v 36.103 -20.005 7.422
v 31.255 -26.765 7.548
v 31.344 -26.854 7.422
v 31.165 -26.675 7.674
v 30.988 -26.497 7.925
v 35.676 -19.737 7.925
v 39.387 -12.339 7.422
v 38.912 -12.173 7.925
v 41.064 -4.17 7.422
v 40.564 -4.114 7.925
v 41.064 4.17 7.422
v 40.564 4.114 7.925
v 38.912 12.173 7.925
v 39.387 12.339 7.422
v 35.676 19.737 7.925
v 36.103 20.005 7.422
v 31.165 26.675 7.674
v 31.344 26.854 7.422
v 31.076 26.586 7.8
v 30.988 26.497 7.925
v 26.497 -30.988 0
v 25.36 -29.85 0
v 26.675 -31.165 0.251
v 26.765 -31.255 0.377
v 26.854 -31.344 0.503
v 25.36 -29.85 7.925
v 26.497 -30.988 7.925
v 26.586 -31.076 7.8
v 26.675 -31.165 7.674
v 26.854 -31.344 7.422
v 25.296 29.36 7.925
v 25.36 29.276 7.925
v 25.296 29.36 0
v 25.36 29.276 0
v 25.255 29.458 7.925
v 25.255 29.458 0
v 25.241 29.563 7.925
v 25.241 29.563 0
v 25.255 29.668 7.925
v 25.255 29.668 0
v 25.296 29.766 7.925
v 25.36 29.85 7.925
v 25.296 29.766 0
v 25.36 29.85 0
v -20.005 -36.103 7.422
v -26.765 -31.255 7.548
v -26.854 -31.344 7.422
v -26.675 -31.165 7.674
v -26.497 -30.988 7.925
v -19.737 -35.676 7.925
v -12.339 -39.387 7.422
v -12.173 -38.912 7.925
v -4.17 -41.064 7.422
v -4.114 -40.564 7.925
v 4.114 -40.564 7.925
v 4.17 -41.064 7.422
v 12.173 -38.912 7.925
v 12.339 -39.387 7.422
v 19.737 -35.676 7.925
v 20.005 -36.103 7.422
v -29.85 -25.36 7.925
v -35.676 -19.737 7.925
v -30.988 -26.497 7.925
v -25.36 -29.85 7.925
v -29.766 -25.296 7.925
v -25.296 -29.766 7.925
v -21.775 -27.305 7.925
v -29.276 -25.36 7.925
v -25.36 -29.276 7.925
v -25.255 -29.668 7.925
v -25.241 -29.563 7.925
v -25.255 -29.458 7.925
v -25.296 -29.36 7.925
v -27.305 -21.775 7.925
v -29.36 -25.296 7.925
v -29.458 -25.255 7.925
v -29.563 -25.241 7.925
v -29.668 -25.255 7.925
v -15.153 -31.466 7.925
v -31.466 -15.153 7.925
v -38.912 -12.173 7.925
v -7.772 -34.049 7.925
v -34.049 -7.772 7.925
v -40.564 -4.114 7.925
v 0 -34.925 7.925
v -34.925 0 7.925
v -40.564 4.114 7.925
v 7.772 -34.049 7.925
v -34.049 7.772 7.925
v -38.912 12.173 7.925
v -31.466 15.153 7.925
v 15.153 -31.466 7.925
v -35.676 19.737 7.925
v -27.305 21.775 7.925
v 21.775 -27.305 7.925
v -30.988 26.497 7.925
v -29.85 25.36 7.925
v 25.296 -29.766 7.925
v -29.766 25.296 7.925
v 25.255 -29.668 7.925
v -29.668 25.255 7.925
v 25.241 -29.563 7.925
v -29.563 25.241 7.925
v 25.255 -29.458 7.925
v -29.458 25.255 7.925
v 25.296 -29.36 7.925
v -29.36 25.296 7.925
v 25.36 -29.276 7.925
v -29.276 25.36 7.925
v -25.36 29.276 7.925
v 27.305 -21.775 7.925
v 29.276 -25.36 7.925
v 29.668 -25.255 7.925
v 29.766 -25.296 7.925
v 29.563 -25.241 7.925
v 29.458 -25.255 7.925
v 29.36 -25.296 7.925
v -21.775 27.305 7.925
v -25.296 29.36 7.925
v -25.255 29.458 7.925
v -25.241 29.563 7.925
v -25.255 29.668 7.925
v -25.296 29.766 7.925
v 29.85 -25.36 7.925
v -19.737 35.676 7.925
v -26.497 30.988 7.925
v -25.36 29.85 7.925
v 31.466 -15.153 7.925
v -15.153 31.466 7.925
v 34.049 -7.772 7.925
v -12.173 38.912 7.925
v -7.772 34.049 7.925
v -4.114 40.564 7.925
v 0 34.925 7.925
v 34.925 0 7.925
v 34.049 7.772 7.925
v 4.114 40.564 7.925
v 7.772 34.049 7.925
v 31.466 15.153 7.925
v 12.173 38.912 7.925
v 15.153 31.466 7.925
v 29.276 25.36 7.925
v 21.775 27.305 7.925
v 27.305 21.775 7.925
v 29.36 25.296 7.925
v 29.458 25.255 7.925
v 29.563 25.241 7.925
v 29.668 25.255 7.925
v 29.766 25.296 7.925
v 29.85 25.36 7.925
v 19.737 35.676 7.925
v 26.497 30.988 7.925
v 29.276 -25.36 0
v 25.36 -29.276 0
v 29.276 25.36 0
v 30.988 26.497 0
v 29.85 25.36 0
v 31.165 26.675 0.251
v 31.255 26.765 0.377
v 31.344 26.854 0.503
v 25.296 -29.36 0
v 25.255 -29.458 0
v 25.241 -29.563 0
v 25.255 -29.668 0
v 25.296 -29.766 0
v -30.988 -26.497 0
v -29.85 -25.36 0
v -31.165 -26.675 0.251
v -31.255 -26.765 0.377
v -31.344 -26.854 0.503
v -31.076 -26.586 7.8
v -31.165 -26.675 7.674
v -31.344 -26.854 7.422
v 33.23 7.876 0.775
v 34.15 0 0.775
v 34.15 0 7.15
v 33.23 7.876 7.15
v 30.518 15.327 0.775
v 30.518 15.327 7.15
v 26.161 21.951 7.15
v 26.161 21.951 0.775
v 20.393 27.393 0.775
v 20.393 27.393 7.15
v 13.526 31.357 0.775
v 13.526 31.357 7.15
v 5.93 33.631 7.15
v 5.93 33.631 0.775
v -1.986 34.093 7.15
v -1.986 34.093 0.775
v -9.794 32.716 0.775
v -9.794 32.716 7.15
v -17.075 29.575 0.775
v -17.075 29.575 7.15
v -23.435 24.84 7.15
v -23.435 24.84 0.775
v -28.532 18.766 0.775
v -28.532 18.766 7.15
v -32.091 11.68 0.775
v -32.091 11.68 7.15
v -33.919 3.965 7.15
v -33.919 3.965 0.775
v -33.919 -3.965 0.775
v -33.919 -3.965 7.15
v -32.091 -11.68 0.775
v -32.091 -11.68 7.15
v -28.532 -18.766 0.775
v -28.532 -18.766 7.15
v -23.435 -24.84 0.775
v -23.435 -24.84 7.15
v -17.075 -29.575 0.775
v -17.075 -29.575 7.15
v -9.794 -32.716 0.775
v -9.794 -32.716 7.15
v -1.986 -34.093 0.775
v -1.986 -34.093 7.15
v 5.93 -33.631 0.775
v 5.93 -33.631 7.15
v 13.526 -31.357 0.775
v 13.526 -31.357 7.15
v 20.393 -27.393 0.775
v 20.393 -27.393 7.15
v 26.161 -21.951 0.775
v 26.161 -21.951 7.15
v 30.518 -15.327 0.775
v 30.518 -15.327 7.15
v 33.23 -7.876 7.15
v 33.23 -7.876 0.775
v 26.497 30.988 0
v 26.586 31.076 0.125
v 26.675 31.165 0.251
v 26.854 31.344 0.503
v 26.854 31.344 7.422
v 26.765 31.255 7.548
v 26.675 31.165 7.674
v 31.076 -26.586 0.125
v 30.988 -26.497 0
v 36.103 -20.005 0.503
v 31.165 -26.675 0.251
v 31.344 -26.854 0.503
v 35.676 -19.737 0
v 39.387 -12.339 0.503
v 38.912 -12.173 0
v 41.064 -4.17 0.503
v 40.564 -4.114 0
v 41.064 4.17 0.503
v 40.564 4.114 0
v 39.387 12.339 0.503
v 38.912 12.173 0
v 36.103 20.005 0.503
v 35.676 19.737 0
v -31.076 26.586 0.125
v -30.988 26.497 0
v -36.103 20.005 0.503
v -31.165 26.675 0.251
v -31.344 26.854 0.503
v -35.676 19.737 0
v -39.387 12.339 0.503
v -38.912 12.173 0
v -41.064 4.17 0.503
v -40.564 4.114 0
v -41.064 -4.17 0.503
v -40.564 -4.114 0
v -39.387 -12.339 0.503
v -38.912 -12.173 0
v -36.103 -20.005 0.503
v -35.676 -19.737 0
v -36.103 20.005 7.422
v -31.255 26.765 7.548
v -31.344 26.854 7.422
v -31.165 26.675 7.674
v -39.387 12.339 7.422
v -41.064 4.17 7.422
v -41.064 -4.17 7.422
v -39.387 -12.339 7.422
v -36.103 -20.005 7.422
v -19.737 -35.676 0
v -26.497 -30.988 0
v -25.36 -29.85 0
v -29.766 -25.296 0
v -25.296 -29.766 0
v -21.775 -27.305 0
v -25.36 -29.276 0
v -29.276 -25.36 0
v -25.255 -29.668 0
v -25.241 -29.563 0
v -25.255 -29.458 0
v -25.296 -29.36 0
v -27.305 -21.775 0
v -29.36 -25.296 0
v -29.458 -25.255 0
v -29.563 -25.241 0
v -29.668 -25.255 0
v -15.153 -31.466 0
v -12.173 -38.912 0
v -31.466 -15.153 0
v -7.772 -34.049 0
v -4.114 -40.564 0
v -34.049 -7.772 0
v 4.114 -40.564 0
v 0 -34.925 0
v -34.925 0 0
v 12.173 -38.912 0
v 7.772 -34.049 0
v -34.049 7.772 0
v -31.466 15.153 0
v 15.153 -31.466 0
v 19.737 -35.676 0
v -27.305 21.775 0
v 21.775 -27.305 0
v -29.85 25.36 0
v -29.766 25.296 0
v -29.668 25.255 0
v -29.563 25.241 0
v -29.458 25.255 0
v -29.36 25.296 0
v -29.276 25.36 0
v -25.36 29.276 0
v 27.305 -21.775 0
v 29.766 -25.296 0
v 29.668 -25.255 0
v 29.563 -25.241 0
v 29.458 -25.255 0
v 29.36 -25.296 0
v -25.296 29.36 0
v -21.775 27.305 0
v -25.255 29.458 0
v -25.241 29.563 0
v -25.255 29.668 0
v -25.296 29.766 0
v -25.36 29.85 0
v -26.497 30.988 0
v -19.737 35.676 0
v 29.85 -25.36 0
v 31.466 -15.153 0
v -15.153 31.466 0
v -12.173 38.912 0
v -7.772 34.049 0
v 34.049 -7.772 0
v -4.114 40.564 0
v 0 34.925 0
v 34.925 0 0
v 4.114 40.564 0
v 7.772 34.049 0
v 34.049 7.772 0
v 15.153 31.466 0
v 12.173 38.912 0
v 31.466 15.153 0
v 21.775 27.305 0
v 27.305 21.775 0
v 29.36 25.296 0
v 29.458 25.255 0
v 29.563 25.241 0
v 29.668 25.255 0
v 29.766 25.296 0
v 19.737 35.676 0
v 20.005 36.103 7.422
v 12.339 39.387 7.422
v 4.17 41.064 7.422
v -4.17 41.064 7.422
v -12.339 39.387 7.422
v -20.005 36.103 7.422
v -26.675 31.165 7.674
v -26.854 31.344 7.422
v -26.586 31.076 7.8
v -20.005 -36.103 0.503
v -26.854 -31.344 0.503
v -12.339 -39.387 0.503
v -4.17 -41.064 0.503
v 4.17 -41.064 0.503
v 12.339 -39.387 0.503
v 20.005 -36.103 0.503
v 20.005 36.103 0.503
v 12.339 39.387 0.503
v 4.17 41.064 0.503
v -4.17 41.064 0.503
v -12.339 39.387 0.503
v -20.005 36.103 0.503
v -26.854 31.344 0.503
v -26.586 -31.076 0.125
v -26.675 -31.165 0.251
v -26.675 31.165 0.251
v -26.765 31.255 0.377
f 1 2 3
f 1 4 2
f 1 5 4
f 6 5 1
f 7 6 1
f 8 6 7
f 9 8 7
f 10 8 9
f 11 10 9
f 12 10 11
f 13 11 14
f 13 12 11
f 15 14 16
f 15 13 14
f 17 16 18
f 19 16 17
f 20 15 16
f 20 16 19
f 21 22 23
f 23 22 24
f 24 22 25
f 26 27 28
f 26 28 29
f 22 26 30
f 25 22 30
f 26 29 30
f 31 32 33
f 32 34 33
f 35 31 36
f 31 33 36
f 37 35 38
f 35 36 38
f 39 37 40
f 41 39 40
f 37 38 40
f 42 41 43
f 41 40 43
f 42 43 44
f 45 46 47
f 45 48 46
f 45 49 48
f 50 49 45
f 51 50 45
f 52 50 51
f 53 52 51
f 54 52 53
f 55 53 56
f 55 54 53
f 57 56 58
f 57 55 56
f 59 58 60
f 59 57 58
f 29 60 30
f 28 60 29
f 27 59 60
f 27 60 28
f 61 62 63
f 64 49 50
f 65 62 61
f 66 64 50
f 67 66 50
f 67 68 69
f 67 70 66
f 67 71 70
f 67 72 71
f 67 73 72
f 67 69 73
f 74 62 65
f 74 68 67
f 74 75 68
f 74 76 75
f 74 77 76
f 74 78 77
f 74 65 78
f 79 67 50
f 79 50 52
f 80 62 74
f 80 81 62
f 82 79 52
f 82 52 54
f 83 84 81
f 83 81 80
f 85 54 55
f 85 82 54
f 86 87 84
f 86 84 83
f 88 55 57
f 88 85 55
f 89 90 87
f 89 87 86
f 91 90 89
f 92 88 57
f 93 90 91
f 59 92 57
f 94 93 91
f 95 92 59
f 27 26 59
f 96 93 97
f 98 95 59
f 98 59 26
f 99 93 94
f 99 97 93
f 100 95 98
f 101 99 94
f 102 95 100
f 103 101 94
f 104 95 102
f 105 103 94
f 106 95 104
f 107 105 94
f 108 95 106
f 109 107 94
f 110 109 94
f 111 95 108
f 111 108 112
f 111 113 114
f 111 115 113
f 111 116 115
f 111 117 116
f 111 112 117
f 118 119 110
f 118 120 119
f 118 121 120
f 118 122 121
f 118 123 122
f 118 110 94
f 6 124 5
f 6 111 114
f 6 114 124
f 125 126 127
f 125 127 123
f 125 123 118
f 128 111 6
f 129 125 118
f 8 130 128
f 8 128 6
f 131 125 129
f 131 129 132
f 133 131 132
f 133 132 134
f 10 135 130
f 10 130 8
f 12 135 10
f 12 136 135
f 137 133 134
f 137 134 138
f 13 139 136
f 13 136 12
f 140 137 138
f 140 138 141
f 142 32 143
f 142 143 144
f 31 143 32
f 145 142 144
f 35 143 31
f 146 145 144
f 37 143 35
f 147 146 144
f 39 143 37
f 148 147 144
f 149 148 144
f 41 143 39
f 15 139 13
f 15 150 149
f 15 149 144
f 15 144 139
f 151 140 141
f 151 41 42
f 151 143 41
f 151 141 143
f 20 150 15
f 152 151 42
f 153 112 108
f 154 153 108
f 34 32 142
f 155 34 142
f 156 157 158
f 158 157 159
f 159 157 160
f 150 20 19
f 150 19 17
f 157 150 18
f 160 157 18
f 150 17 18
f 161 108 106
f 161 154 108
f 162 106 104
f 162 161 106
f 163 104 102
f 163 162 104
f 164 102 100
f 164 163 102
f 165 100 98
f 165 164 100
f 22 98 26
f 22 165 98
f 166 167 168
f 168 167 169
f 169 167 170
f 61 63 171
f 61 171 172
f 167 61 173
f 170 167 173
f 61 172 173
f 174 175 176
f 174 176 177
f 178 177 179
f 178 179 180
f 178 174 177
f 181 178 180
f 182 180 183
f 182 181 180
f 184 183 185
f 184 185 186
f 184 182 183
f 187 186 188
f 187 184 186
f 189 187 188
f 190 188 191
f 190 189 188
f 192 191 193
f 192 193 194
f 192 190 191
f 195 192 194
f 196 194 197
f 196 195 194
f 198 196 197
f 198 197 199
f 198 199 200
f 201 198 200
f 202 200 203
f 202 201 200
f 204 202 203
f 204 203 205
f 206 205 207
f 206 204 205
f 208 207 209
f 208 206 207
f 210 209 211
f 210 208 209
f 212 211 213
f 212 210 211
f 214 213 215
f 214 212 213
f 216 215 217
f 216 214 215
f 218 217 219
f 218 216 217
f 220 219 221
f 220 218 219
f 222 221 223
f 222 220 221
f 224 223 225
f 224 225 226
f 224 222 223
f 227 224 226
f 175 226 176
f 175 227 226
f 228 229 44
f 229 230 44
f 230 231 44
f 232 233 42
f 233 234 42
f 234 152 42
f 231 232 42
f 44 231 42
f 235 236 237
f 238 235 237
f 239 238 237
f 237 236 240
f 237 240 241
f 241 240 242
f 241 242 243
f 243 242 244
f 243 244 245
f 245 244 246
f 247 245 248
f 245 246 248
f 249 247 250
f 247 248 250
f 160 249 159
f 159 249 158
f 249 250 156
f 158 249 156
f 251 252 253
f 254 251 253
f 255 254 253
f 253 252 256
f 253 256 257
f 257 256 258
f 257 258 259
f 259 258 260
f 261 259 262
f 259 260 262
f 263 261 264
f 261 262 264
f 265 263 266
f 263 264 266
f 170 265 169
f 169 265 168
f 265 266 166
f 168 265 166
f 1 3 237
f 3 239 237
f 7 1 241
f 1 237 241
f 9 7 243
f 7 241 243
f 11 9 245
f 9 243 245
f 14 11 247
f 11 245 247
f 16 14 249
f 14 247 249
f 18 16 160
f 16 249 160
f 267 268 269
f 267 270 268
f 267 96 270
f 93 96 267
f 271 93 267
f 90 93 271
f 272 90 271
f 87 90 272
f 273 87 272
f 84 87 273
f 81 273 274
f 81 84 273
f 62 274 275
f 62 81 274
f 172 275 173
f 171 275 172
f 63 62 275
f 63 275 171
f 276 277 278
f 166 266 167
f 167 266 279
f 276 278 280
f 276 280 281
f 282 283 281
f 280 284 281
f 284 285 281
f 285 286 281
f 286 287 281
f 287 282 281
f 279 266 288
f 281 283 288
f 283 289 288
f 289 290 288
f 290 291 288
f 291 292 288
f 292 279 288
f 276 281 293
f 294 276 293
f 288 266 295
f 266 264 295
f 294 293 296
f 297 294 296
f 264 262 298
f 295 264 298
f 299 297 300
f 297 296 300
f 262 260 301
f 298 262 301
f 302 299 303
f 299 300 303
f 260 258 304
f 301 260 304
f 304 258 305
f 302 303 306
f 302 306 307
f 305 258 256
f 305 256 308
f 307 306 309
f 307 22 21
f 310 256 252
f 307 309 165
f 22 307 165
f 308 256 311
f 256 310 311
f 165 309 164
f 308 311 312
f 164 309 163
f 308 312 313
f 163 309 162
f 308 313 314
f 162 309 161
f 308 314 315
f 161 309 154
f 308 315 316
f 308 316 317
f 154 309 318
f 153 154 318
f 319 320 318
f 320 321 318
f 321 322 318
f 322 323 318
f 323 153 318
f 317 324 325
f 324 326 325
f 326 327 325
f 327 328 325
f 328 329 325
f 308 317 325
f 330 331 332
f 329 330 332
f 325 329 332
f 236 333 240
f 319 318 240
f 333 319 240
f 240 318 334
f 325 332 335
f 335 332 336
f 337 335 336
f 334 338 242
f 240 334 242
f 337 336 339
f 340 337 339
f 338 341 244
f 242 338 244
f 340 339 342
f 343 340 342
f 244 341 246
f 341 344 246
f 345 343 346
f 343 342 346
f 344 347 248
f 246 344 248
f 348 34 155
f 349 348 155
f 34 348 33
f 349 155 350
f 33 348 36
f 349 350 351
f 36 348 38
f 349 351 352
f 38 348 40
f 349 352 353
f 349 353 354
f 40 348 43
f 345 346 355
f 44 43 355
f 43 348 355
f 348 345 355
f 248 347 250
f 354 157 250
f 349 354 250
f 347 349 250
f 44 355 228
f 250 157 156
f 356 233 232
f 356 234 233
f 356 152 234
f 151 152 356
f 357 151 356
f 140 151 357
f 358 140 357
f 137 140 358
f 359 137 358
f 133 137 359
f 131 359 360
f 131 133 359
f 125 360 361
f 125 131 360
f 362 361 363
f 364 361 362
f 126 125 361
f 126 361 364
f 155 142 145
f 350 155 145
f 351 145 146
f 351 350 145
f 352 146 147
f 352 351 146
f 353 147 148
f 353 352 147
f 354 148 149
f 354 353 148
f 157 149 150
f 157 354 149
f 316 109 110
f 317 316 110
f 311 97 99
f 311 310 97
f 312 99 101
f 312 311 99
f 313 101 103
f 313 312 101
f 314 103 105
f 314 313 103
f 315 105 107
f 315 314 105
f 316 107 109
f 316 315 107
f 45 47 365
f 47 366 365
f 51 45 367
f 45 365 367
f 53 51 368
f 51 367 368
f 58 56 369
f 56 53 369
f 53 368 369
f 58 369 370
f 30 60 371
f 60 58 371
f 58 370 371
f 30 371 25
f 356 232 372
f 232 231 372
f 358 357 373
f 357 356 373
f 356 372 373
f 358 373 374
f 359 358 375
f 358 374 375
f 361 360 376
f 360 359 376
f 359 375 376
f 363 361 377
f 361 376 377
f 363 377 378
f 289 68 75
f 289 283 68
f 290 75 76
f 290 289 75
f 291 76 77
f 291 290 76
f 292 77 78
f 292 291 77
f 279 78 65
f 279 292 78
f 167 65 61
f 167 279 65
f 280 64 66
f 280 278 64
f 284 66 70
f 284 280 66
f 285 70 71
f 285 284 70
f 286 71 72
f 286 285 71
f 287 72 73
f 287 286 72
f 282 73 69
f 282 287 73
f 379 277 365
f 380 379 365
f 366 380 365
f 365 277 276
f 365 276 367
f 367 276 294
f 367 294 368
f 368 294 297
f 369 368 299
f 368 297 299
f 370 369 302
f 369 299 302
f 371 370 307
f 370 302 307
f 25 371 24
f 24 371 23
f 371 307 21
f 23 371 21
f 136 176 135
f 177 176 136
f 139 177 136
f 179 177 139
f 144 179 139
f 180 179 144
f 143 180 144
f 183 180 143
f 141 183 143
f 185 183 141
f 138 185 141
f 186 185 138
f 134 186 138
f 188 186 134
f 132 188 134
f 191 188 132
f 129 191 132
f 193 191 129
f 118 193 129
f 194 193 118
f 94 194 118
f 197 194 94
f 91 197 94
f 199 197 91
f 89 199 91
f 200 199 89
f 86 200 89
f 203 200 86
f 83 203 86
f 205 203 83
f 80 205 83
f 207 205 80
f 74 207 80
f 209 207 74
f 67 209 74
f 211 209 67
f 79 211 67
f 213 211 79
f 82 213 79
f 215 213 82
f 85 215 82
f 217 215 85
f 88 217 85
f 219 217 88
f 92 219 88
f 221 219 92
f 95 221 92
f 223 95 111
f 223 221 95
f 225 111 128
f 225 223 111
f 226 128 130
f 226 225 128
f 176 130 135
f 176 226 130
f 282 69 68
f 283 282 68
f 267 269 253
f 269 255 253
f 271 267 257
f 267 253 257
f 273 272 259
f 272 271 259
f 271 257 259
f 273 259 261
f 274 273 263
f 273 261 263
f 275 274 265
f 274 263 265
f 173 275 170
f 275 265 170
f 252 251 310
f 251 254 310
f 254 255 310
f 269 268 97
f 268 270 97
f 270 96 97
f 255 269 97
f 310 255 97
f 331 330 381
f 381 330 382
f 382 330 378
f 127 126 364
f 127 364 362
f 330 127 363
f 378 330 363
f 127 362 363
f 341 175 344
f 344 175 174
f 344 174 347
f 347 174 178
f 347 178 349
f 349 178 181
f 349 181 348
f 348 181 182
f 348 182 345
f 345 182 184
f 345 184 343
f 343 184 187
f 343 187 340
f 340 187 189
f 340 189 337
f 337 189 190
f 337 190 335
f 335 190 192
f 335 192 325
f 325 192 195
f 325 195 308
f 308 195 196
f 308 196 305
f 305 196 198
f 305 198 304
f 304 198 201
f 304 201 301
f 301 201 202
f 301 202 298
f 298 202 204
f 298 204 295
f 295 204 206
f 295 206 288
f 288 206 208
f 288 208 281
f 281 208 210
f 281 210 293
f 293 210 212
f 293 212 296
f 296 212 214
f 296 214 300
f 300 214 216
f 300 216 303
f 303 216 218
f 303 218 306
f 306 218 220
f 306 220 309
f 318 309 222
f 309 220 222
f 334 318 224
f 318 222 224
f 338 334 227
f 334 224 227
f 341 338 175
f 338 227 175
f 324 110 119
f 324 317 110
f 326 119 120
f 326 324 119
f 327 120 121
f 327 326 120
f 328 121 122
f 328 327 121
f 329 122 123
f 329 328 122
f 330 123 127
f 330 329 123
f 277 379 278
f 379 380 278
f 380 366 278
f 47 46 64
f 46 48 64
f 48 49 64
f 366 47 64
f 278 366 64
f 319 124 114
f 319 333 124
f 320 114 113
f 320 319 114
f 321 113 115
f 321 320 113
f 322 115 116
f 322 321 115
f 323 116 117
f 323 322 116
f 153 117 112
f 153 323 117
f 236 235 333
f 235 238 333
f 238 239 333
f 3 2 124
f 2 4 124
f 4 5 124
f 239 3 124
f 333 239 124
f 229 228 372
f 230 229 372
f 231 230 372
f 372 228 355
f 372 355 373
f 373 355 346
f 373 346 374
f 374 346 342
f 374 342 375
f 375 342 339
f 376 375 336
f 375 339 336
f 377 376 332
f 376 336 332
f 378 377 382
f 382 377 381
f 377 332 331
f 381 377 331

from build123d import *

# Parameters (mm, degrees)
SKETCH1_R                = 41.275
SKETCH1_R_2              = 34.1503
EXTRUDE1_DEPTH           = 7.9248
CHAMFER1_SIZE            = 0.503174
CHAMFER2_SIZE            = 0.7747
CUT_EXTRUDE1_DEPTH       = 8.9248
FILLET1_R                = 0.4064
CIRPATTERN1_COUNT        = 4
FILLET1_OF_CIRPATTERN1_R = 0.4064


with BuildPart() as part:
    # Sketch1 → Extrude1 (new body)
    with BuildSketch(Plane.XY):
        Circle(SKETCH1_R)
        Circle(SKETCH1_R_2, mode=Mode.SUBTRACT)
    extrude(amount=EXTRUDE1_DEPTH)

    # Chamfer1
    chamfer1_edges = [part.edges().sort_by_distance(p)[0] for p in [
        (-41.275, 0, 0),
        (-41.275, 0, 7.9248),
    ]]
    chamfer(chamfer1_edges, length=CHAMFER1_SIZE)

    # Chamfer2
    chamfer2_edges = [part.edges().sort_by_distance(p)[0] for p in [
        (-34.1503, 0, 0),
        (-34.1503, 0, 7.9248),
    ]]
    chamfer(chamfer2_edges, length=CHAMFER2_SIZE)

    # Sketch2 → Cut-Extrude1 (cut, through all)
    with BuildSketch(Plane.XY.offset(7.9248)):
        with BuildLine():
            Line((26.854291633, 31.344419693), (25.07287509, 29.563003151))
            Line((25.07287509, 29.563003151), (29.563003151, 25.07287509))
            Line((29.563003151, 25.07287509), (31.344419693, 26.854291633))
            ThreePointArc((31.344419693, 26.854291633), (29.185832393, 29.185832393), (26.854291633, 31.344419693))
        make_face()
    cut_extrude1 = extrude(amount=-CUT_EXTRUDE1_DEPTH, mode=Mode.SUBTRACT)

    # Fillet1
    fillet1_edges = [part.edges().sort_by_distance(p)[0] for p in [
        (29.563003151, 25.07287509, 3.9624),
        (25.07287509, 29.563003151, 3.9624),
    ]]
    fillet(fillet1_edges, radius=FILLET1_R)

    # CirPattern1: Cut-Extrude1 ×4 about axis
    cirpattern1_axis = Axis((0, 0, 0), (0, 0, 1))
    for i in range(1, CIRPATTERN1_COUNT):
        add(cut_extrude1.rotate(cirpattern1_axis, i * 360 / CIRPATTERN1_COUNT), mode=Mode.SUBTRACT)

    # Fillet1 of CirPattern1
    fillet1_of_cirpattern1_edges = [part.edges().sort_by_distance(p)[0] for p in [
        (-25.07287509, 29.563003151, 3.9624),
        (-29.563003151, 25.07287509, 3.9624),
        (-29.563003151, -25.07287509, 3.9624),
        (-25.07287509, -29.563003151, 3.9624),
        (25.07287509, -29.563003151, 3.9624),
        (29.563003151, -25.07287509, 3.9624),
    ]]
    fillet(fillet1_of_cirpattern1_edges, radius=FILLET1_OF_CIRPATTERN1_R)


solid = part.part
